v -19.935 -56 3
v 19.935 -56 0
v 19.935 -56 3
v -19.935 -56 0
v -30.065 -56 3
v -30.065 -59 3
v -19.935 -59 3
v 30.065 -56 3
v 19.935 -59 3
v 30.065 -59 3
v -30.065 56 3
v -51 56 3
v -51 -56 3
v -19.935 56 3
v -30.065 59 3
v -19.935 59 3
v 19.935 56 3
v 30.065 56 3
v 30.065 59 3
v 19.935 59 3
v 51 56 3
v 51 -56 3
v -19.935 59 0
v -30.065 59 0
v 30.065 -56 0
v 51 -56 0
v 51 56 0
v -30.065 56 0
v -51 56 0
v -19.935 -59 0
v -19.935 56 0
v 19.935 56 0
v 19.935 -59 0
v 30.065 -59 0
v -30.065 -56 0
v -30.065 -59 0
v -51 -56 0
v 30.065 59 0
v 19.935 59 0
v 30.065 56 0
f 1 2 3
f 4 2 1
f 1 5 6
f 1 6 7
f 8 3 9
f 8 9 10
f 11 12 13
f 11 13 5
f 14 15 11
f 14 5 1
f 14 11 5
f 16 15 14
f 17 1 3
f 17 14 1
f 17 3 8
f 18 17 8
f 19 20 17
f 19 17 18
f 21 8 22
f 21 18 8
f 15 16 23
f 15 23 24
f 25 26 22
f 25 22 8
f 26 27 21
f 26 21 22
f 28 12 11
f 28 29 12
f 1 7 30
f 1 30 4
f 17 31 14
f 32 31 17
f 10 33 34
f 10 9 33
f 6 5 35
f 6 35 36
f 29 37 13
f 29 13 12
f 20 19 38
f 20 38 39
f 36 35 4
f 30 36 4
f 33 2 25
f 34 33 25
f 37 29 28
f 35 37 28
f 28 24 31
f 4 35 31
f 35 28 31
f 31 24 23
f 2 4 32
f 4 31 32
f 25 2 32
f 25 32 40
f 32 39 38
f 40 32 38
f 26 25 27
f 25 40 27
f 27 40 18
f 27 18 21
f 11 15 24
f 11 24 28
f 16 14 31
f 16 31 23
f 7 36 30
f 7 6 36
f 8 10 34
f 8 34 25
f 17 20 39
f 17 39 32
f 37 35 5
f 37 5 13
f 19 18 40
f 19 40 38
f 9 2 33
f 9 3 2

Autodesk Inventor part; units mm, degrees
ref_plane "YZ Plane" through (0, 0, 0) normal (1, 0, 0) x (0, 1, 0)
ref_plane "XZ Plane" through (0, 0, 0) normal (0, 1, 0) x (-1, 0, 0)
sketch "Sketch1" plane through (0, 0, 0) normal (0, 0, 1) x (1, 0, 0)
  line L0 (-51, 56) -> (51, 56)
  line L1 (51, 56) -> (51, -56)
  line L2 (51, -56) -> (-51, -56)
  line L3 (-51, -56) -> (-51, 56)
  line L4 (-51, 56) -> (51, -56) construction
  line L5 (51, 56) -> (-51, -56) construction
  point P0 (0, 0)
  point P1 (0, 0)
  point P2 (0, 0)
  dimension "d0" = 102
  dimension "d1" = 112
extrude "Extrusion1" add sketch "Sketch1" along normal blind 3
sketch "Sketch2" plane through (0, 0, 3) normal (0, 0, 1) x (1, 0, 0)
  line L0 (-51, -56) -> (51, -56) projected
  line L1 (-30.065, -59) -> (-19.935, -59)
  line L2 (-19.935, -59) -> (-19.935, -56)
  line L3 (-19.935, -56) -> (-30.065, -56)
  line L4 (-30.065, -56) -> (-30.065, -59)
  line L5 (-30.065, -59) -> (-19.935, -56) construction
  line L6 (-19.935, -59) -> (-30.065, -56) construction
  line L7 (19.935, -59) -> (30.065, -59)
  line L8 (30.065, -59) -> (30.065, -56)
  line L9 (30.065, -56) -> (19.935, -56)
  line L10 (19.935, -56) -> (19.935, -59)
  line L11 (19.935, -59) -> (30.065, -56) construction
  line L12 (30.065, -59) -> (19.935, -56) construction
  point P0 (0, 0)
  point P1 (-25, -57.5)
  point P2 (25, -57.5)
  dimension "d4" = 3
  dimension "d5" = 25
  dimension "d6" = 25
  dimension "d7" = 10.13
  dimension "d8" = 10.13
extrude "Extrusion2" add sketch "Sketch2" against normal blind 3
mirror "Mirror1" about plane through (0, 0, 0) normal (0, 1, 0) of "Extrusion2"
sketch "Sketch3" plane through (0, 0, 0) normal (0, 0, -1) x (-1, 0, 0)
  line L0 (-51, -56) -> (-51, 56) construction
  line L1 (-51, 55) -> (51, 55) construction
  line L2 (51, 56) -> (51, -56) construction
  line L3 (-51, -55) -> (51, -55) construction
  line L4 (-19.935, -56) -> (19.935, -56) construction
  line L5 (-30.065, 56) -> (-51, 56) construction
  point P0 (0, 0)
  dimension "d11" = 1
  dimension "d12" = 1
ref_plane "Work Plane1" through (-19.935, -55, 0) normal (0, -1, 0) x (1, 0, 0)
sketch "Sketch6" plane through (0, 0, 3) normal (0, 0, 1) x (1, 0, 0)
  line L0 (30.065, -56) -> (51, -56) projected
  line L1 (51, -56) -> (51, 56) projected
  point P0 (0, 0)
  point P1 (20.6, -36.4)
  dimension "d41" = 19.6
  dimension "d42" = 30.4
hole "Hole4" [suppressed]
pattern_linear "Rectangular Pattern1" [suppressed]
sketch "Sketch7" plane through (0, 0, 3) normal (0, 0, 1) x (1, 0, 0)
  spline S0 degree 3 poles (-17.7549, 22.0592) (-20.3586, 22.7486) (-27.8891, 27.7258) (-21.8129, 49.2984) knots 3 3 3 3 4 4 4 4
  line L0 (-20.3586, 22.7486) -> (-27.8891, 27.7258) construction
  line L1 (-17.7549, 22.0592) -> (-20.3586, 22.7486) construction
  line L2 (-27.8891, 27.7258) -> (-21.8129, 49.2984) construction
  spline S1 degree 3 poles (-35.4301, 25.2372) (-34.47, 24.8476) (-28.6027, 22.0592) (-17.7549, 22.0592) knots 2 2 2 2 3 3 3 3
  line L3 (-35.4301, 25.2372) -> (-34.47, 24.8476) construction
  line L4 (-34.47, 24.8476) -> (-28.6027, 22.0592) construction
  line L5 (-28.6027, 22.0592) -> (-17.7549, 22.0592) construction
  spline S2 degree 3 poles (-41.3451, 44.549) (-42.3928, 42.443) (-47.2601, 32.6596) (-35.4301, 25.2372) knots 1 1 1 1 2 2 2 2
  line L6 (-41.3451, 44.549) -> (-42.3928, 42.443) construction
  line L7 (-42.3928, 42.443) -> (-47.2601, 32.6596) construction
  line L8 (-47.2601, 32.6596) -> (-35.4301, 25.2372) construction
  spline S3 degree 3 poles (-37.458, 43.3832) (-40.0894, 43.0815) (-41.2381, 43.3832) (-41.3451, 44.549) knots 0 0 0 0 1 1 1 1
  line L9 (-40.0894, 43.0815) -> (-41.2381, 43.3832) construction
  line L10 (-37.458, 43.3832) -> (-40.0894, 43.0815) construction
  line L11 (-41.2381, 43.3832) -> (-41.3451, 44.549) construction
  spline S4 degree 3 poles (-21.8129, 49.2984) (-21.8202, 49.2933) (-29.1299, 44.232) (-37.458, 43.3832) knots 4 4 4 4 5 5 5 5
  line L12 (-21.8129, 49.2984) -> (-29.1299, 44.232) construction
  line L13 (-29.1299, 44.232) -> (-37.458, 43.3832) construction
  spline S5 degree 3 poles (-15.7483, 21.8123) (-16.0581, 21.8979) (-29.0611, 22.4788) (-21.0119, 50.2568) knots 3 3 3 3 4 4 4 4
  line L14 (-15.7483, 21.8123) -> (-16.0581, 21.8979) construction
  line L15 (-16.0581, 21.8979) -> (-29.0611, 22.4788) construction
  line L16 (-29.0611, 22.4788) -> (-21.0119, 50.2568) construction
  spline S6 degree 3 poles (-21.0119, 50.2568) (-21.2194, 50.1207) (-29.151, 44.9225) (-36.6832, 43.8886) knots 4 4 4 4 5 5 5 5
  line L17 (-21.0119, 50.2568) -> (-21.2194, 50.1207) construction
  line L18 (-21.2194, 50.1207) -> (-29.151, 44.9225) construction
  line L19 (-29.151, 44.9225) -> (-36.6832, 43.8886) construction
  line L20 (-36.6832, 43.8886) -> (-35.9502, 47.0532)
  spline S7 degree 3 poles (-35.9502, 47.0532) (-35.9625, 47.0497) (-40.7954, 45.8307) (-41.6808, 44.7755) knots 0 0 0 0 1 1 1 1
  line L21 (-35.9502, 47.0532) -> (-35.9625, 47.0497) construction
  line L22 (-35.9625, 47.0497) -> (-40.7954, 45.8307) construction
  line L23 (-40.7954, 45.8307) -> (-41.6808, 44.7755) construction
  spline S8 degree 3 poles (-41.6808, 44.7755) (-41.6808, 44.7755) (-49.0375, 32.8716) (-35.5714, 24.8043) knots 1 1 1 1 2 2 2 2
  line L24 (-41.6808, 44.7755) -> (-41.6808, 44.7755) construction
  line L25 (-41.6808, 44.7755) -> (-49.0375, 32.8716) construction
  line L26 (-49.0375, 32.8716) -> (-35.5714, 24.8043) construction
  spline S9 degree 3 poles (-35.5714, 24.8043) (-35.5511, 24.7921) (-28.5456, 20.8762) (-15.7483, 21.8123) knots 2 2 2 2 3 3 3 3
  line L27 (-35.5714, 24.8043) -> (-35.5511, 24.7921) construction
  line L28 (-35.5511, 24.7921) -> (-28.5456, 20.8762) construction
  line L29 (-28.5456, 20.8762) -> (-15.7483, 21.8123) construction
  line L30 (-15.2682, 33.8195) -> (-22.3387, 33.8195) construction
  line L31 (-22.3387, 33.8195) -> (-22.3387, 39.2773) construction
  line L32 (-22.3387, 39.2773) -> (-15.2682, 39.2773) construction
  line L33 (-15.2682, 39.2773) -> (-15.2682, 33.8195) construction
  line L34 (-24.7016, 33.8748) -> (-43.5687, 33.8748) construction
  line L35 (-43.5687, 33.8748) -> (-43.5687, 39.6523) construction
  line L36 (-43.5687, 39.6523) -> (-24.7016, 39.6523) construction
  line L37 (-24.7016, 39.6523) -> (-24.7016, 33.8748) construction
  line L38 (-13.4408, 37.5513) -> (-45.6182, 37.5513) construction
  spline S10 degree 3 poles (38.6981, -46.4393) (32.5457, -44.8102) (14.7509, -33.0491) (29.1091, 17.9269) knots 3 3 3 3 4 4 4 4
  line L39 (38.6981, -46.4393) -> (32.5457, -44.8102) construction
  line L40 (32.5457, -44.8102) -> (14.7509, -33.0491) construction
  line L41 (14.7509, -33.0491) -> (29.1091, 17.9269) construction
  spline S11 degree 3 poles (-3.0683, -38.9296) (-0.7996, -39.8503) (13.0647, -46.4393) (38.6981, -46.4393) knots 2 2 2 2 3 3 3 3
  line L42 (-3.0683, -38.9296) -> (-0.7996, -39.8503) construction
  line L43 (-0.7996, -39.8503) -> (13.0647, -46.4393) construction
  line L44 (13.0647, -46.4393) -> (38.6981, -46.4393) construction
  spline S12 degree 3 poles (-17.0455, 6.7041) (-19.5213, 1.7277) (-31.0226, -21.3906) (-3.0683, -38.9296) knots 1 1 1 1 2 2 2 2
  line L45 (-17.0455, 6.7041) -> (-19.5213, 1.7277) construction
  line L46 (-19.5213, 1.7277) -> (-31.0226, -21.3906) construction
  line L47 (-31.0226, -21.3906) -> (-3.0683, -38.9296) construction
  spline S13 degree 3 poles (-7.8603, 3.9492) (-14.0782, 3.2364) (-16.7927, 3.9492) (-17.0455, 6.7041) knots 0 0 0 0 1 1 1 1
  line L48 (-7.8603, 3.9492) -> (-14.0782, 3.2364) construction
  line L49 (-14.0782, 3.2364) -> (-16.7927, 3.9492) construction
  line L50 (-16.7927, 3.9492) -> (-17.0455, 6.7041) construction
  spline S14 degree 3 poles (29.1091, 17.9269) (29.0918, 17.9149) (11.819, 5.9549) (-7.8603, 3.9492) knots 4 4 4 4 5 5 5 5
  line L51 (29.1091, 17.9269) -> (11.819, 5.9549) construction
  line L52 (11.819, 5.9549) -> (-7.8603, 3.9492) construction
  spline S15 degree 3 poles (43.4399, -47.0227) (42.7078, -46.8204) (11.9815, -45.4479) (31.0019, 20.1915) knots 3 3 3 3 4 4 4 4
  line L53 (43.4399, -47.0227) -> (42.7078, -46.8204) construction
  line L54 (42.7078, -46.8204) -> (11.9815, -45.4479) construction
  line L55 (11.9815, -45.4479) -> (31.0019, 20.1915) construction
  spline S16 degree 3 poles (31.0019, 20.1915) (30.5115, 19.8701) (11.7692, 7.5867) (-6.0293, 5.1437) knots 4 4 4 4 5 5 5 5
  line L56 (31.0019, 20.1915) -> (30.5115, 19.8701) construction
  line L57 (30.5115, 19.8701) -> (11.7692, 7.5867) construction
  line L58 (11.7692, 7.5867) -> (-6.0293, 5.1437) construction
  line L59 (-6.0293, 5.1437) -> (-4.2974, 12.6214)
  spline S17 degree 3 poles (-4.2974, 12.6214) (-4.3264, 12.6132) (-15.7465, 9.7327) (-17.8388, 7.2392) knots 0 0 0 0 1 1 1 1
  line L60 (-4.2974, 12.6214) -> (-4.3264, 12.6132) construction
  line L61 (-4.3264, 12.6132) -> (-15.7465, 9.7327) construction
  line L62 (-15.7465, 9.7327) -> (-17.8388, 7.2392) construction
  spline S18 degree 3 poles (-17.8388, 7.2392) (-17.8388, 7.2392) (-35.2226, -20.8896) (-3.4022, -39.9527) knots 1 1 1 1 2 2 2 2
  line L63 (-17.8388, 7.2392) -> (-17.8388, 7.2392) construction
  line L64 (-17.8388, 7.2392) -> (-35.2226, -20.8896) construction
  line L65 (-35.2226, -20.8896) -> (-3.4022, -39.9527) construction
  spline S19 degree 3 poles (-3.4022, -39.9527) (-3.3542, -39.9815) (13.1998, -49.2348) (43.4399, -47.0227) knots 2 2 2 2 3 3 3 3
  line L66 (-3.4022, -39.9527) -> (-3.3542, -39.9815) construction
  line L67 (-3.3542, -39.9815) -> (13.1998, -49.2348) construction
  line L68 (13.1998, -49.2348) -> (43.4399, -47.0227) construction
  line L69 (44.5744, -18.6497) -> (27.8666, -18.6497) construction
  line L70 (27.8666, -18.6497) -> (27.8666, -5.753) construction
  line L71 (27.8666, -5.753) -> (44.5744, -5.753) construction
  line L72 (44.5744, -5.753) -> (44.5744, -18.6497) construction
  line L73 (22.2831, -18.519) -> (-22.2999, -18.519) construction
  line L74 (-22.2999, -18.519) -> (-22.2999, -4.8668) construction
  line L75 (-22.2999, -4.8668) -> (22.2831, -4.8668) construction
  line L76 (22.2831, -4.8668) -> (22.2831, -18.519) construction
  line L77 (48.8924, -17.3822) -> (-27.1429, -9.8315) construction
  point P0 (0, 0)
  point P1 (-46.1734, 35.5024)
  point P2 (-28.4547, -14.6731)
  point P3 (36.4717, -44.6082)
  point P4 (32.5457, -41.4669)
  point P5 (29.1091, -36.761)
  point P6 (27.1695, -32.4025)
  point P7 (25.7734, -27.2321)
  point P8 (24.9854, -21.3562)
  point P9 (24.7959, -14.6712)
  point P10 (25.3026, -6.9857)
  point P11 (26.1472, -0.3981)
  point P12 (27.414, 5.5982)
  point P13 (28.9178, 11.9055)
  point P14 (23.0904, 15.6216)
  point P15 (16.165, 12.2433)
  point P16 (8.2261, 8.9495)
  point P17 (0.7095, 6.6692)
  point P18 (-13.648, 9.5407)
  point P19 (-20.2241, 2.0414)
  point P20 (-22.4199, -6.8265)
  point P21 (-21.9132, -16.5389)
  point P22 (-18.6194, -25.4913)
  point P23 (-13.721, -31.9099)
  point P24 (-8.4465, -36.7937)
  point P25 (-1.1832, -41.0165)
  point P26 (7.0934, -43.888)
  point P27 (14.1878, -45.4927)
  point P28 (21.8732, -46.6751)
  point P29 (34.6261, -47.3507)
  point P30 (28.2919, -47.1818)
  point P31 (-5.2552, 8.4859)
  point P32 (-13.2219, 3.7788)
  point P33 (-8.6285, 11.4147)
  point P34 (-16.5626, 5.2105)
  point P35 (-9.2199, 3.595)
hole "Hole5" [suppressed]
equation "\"d6\" = d5"
equation "\"d8\" = d7"
equation "\"d12\" = d11"
equation "\"kerf\" = 0.13"
properties part number "TopPanel" material "Acrylic, Clear"
